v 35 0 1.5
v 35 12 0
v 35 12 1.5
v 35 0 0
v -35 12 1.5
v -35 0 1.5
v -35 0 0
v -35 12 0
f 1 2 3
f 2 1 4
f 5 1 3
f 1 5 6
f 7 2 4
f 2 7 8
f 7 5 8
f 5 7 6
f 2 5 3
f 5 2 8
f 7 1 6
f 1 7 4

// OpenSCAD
// 10-well comb for agarose gel casting, printed lying flat
// Units: mm

// ---- Spine ----
spine_len   = 70;   // spine length (X)
spine_wid   = 12;   // spine width (Y)

// ---- Teeth ----
n_teeth     = 10;   // number of teeth
tooth_w     = 5.0;  // tooth width (X)
tooth_len   = 12;   // tooth length (Y), hanging in -Y
gap         = 1.5;  // gap between neighbouring teeth (X)

// ---- Misc ----
eps         = 0.5;  // cutter overshoot past faces
$fn         = 64;

// Derived
pitch       = tooth_w + gap;          // centre-to-centre spacing
row_span    = (n_teeth - 1) * gap;    // total gap width
x_start     = -row_span / 2;          // first tooth centre (row centred)

difference() {
    // Spine (back bar)
    translate([-spine_len / 2, 0, 0])
        cube([spine_len, spine_wid, 1.5]);

    // Teeth cut out from the top face
    for (i = [0 : n_teeth - 1])
        translate([x_start + i * pitch - tooth_w / 2,
                   -tooth_len,
                   spine_wid - eps])
            cube([tooth_w, tooth_len + eps, 1.5]);
}
